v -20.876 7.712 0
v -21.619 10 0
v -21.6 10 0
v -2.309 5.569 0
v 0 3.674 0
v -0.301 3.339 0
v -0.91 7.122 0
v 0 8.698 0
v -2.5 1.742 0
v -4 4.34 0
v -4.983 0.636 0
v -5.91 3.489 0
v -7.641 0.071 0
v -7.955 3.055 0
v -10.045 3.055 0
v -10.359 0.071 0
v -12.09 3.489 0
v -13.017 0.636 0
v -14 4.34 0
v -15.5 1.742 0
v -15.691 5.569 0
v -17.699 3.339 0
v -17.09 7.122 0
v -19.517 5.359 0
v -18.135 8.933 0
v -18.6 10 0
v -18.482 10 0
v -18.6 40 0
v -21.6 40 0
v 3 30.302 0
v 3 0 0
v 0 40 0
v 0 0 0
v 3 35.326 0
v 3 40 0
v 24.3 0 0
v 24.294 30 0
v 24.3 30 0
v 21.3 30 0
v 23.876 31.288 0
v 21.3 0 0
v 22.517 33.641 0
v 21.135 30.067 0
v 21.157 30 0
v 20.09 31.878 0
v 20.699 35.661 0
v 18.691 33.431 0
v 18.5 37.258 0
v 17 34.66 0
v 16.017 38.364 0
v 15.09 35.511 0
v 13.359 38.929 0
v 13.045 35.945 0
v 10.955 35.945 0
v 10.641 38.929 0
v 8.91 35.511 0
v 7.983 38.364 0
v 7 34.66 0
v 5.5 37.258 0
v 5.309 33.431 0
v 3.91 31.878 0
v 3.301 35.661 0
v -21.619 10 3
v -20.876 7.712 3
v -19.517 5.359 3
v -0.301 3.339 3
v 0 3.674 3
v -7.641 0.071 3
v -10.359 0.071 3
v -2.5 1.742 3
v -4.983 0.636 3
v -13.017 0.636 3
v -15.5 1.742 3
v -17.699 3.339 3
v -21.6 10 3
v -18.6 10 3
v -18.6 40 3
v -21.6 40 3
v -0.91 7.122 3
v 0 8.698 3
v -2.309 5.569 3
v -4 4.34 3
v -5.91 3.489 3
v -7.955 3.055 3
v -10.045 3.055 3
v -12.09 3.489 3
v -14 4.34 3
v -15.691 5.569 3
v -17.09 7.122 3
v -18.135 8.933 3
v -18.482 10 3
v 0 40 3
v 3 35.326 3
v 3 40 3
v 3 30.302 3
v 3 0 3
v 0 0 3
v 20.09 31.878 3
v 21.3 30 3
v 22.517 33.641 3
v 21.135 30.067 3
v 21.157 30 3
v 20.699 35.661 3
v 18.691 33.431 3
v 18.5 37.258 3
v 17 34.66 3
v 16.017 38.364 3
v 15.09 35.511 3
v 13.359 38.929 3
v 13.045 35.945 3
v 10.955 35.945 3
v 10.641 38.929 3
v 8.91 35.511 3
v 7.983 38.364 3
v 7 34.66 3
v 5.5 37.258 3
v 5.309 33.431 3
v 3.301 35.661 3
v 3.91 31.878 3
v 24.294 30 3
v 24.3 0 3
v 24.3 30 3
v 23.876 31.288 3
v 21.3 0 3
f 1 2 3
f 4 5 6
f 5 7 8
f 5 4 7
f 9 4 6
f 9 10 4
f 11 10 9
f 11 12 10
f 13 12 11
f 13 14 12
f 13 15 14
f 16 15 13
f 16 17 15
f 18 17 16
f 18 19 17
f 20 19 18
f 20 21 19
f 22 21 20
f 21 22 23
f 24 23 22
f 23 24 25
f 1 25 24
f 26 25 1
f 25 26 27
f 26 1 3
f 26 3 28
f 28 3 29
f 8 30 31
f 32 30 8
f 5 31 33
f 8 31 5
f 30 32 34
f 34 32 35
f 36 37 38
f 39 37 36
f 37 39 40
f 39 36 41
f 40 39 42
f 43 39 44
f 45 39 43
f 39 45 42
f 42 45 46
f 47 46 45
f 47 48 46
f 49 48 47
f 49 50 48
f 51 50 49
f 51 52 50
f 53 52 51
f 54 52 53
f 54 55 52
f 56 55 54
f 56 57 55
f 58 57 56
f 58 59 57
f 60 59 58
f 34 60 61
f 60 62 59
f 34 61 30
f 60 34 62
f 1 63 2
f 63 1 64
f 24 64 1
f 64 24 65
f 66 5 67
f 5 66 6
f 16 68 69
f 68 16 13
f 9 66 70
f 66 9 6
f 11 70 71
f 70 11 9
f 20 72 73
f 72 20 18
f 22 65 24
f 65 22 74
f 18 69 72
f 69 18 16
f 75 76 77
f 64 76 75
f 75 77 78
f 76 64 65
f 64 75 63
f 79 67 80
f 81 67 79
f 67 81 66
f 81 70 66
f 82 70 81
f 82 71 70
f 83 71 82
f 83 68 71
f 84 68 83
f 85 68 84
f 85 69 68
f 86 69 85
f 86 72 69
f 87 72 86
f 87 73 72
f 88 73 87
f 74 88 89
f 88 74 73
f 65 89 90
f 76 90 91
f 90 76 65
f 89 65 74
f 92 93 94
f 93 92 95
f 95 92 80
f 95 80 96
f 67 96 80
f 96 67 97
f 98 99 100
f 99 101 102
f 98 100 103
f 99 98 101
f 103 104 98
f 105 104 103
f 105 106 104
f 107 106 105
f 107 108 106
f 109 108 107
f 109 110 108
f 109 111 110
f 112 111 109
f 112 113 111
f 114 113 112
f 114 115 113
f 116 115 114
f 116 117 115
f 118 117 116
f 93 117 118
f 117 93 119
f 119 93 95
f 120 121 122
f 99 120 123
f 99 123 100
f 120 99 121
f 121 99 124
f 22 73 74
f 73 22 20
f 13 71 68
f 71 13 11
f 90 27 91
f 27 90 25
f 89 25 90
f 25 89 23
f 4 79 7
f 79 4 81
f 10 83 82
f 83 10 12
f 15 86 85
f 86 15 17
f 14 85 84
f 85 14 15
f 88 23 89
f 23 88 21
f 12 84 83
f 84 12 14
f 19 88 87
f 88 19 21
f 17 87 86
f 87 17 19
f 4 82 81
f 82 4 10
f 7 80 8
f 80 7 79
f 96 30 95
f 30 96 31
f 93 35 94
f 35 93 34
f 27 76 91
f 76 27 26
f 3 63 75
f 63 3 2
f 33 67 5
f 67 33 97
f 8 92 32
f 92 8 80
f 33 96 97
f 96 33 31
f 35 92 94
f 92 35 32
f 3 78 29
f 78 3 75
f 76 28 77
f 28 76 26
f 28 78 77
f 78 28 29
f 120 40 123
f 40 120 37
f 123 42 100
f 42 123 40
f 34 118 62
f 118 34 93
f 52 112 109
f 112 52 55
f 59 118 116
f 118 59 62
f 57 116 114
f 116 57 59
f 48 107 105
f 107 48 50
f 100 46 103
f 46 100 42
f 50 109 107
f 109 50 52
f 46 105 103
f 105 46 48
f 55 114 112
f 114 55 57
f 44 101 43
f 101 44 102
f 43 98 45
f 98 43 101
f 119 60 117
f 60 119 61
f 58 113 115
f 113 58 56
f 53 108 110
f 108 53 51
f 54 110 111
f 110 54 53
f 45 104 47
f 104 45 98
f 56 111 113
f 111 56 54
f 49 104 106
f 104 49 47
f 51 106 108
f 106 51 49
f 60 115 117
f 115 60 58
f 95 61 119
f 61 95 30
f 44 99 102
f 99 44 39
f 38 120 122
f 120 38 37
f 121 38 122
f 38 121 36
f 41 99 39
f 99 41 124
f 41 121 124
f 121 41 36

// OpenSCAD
//U
translate([3,40,0])
rotate([0,0,180]){
union(){
cube([3,40,3]);
difference(){  
  translate([12,27,0]) cylinder(3,13,13);
  translate([12,27,-1]) cylinder(5,10,10);
  translate([0,10,-1]) cube([30,20,5]);
  translate([-3,0,-1]) cube([3,40,5]);

}
  translate([21.6,0,0]) cube([3,30,3]);
}
}



// буква n

union(){
cube([3,40,3]);
difference(){  
  translate([12,26,0]) cylinder(3,13,13);
  translate([12,26,-1]) cylinder(5,10,10);
  translate([0,10,-1]) cube([30,20,5]);
  translate([-3,0,-1]) cube([3,40,5]);

}
  translate([21.3,0,0]) cube([3,30,3]);
}
